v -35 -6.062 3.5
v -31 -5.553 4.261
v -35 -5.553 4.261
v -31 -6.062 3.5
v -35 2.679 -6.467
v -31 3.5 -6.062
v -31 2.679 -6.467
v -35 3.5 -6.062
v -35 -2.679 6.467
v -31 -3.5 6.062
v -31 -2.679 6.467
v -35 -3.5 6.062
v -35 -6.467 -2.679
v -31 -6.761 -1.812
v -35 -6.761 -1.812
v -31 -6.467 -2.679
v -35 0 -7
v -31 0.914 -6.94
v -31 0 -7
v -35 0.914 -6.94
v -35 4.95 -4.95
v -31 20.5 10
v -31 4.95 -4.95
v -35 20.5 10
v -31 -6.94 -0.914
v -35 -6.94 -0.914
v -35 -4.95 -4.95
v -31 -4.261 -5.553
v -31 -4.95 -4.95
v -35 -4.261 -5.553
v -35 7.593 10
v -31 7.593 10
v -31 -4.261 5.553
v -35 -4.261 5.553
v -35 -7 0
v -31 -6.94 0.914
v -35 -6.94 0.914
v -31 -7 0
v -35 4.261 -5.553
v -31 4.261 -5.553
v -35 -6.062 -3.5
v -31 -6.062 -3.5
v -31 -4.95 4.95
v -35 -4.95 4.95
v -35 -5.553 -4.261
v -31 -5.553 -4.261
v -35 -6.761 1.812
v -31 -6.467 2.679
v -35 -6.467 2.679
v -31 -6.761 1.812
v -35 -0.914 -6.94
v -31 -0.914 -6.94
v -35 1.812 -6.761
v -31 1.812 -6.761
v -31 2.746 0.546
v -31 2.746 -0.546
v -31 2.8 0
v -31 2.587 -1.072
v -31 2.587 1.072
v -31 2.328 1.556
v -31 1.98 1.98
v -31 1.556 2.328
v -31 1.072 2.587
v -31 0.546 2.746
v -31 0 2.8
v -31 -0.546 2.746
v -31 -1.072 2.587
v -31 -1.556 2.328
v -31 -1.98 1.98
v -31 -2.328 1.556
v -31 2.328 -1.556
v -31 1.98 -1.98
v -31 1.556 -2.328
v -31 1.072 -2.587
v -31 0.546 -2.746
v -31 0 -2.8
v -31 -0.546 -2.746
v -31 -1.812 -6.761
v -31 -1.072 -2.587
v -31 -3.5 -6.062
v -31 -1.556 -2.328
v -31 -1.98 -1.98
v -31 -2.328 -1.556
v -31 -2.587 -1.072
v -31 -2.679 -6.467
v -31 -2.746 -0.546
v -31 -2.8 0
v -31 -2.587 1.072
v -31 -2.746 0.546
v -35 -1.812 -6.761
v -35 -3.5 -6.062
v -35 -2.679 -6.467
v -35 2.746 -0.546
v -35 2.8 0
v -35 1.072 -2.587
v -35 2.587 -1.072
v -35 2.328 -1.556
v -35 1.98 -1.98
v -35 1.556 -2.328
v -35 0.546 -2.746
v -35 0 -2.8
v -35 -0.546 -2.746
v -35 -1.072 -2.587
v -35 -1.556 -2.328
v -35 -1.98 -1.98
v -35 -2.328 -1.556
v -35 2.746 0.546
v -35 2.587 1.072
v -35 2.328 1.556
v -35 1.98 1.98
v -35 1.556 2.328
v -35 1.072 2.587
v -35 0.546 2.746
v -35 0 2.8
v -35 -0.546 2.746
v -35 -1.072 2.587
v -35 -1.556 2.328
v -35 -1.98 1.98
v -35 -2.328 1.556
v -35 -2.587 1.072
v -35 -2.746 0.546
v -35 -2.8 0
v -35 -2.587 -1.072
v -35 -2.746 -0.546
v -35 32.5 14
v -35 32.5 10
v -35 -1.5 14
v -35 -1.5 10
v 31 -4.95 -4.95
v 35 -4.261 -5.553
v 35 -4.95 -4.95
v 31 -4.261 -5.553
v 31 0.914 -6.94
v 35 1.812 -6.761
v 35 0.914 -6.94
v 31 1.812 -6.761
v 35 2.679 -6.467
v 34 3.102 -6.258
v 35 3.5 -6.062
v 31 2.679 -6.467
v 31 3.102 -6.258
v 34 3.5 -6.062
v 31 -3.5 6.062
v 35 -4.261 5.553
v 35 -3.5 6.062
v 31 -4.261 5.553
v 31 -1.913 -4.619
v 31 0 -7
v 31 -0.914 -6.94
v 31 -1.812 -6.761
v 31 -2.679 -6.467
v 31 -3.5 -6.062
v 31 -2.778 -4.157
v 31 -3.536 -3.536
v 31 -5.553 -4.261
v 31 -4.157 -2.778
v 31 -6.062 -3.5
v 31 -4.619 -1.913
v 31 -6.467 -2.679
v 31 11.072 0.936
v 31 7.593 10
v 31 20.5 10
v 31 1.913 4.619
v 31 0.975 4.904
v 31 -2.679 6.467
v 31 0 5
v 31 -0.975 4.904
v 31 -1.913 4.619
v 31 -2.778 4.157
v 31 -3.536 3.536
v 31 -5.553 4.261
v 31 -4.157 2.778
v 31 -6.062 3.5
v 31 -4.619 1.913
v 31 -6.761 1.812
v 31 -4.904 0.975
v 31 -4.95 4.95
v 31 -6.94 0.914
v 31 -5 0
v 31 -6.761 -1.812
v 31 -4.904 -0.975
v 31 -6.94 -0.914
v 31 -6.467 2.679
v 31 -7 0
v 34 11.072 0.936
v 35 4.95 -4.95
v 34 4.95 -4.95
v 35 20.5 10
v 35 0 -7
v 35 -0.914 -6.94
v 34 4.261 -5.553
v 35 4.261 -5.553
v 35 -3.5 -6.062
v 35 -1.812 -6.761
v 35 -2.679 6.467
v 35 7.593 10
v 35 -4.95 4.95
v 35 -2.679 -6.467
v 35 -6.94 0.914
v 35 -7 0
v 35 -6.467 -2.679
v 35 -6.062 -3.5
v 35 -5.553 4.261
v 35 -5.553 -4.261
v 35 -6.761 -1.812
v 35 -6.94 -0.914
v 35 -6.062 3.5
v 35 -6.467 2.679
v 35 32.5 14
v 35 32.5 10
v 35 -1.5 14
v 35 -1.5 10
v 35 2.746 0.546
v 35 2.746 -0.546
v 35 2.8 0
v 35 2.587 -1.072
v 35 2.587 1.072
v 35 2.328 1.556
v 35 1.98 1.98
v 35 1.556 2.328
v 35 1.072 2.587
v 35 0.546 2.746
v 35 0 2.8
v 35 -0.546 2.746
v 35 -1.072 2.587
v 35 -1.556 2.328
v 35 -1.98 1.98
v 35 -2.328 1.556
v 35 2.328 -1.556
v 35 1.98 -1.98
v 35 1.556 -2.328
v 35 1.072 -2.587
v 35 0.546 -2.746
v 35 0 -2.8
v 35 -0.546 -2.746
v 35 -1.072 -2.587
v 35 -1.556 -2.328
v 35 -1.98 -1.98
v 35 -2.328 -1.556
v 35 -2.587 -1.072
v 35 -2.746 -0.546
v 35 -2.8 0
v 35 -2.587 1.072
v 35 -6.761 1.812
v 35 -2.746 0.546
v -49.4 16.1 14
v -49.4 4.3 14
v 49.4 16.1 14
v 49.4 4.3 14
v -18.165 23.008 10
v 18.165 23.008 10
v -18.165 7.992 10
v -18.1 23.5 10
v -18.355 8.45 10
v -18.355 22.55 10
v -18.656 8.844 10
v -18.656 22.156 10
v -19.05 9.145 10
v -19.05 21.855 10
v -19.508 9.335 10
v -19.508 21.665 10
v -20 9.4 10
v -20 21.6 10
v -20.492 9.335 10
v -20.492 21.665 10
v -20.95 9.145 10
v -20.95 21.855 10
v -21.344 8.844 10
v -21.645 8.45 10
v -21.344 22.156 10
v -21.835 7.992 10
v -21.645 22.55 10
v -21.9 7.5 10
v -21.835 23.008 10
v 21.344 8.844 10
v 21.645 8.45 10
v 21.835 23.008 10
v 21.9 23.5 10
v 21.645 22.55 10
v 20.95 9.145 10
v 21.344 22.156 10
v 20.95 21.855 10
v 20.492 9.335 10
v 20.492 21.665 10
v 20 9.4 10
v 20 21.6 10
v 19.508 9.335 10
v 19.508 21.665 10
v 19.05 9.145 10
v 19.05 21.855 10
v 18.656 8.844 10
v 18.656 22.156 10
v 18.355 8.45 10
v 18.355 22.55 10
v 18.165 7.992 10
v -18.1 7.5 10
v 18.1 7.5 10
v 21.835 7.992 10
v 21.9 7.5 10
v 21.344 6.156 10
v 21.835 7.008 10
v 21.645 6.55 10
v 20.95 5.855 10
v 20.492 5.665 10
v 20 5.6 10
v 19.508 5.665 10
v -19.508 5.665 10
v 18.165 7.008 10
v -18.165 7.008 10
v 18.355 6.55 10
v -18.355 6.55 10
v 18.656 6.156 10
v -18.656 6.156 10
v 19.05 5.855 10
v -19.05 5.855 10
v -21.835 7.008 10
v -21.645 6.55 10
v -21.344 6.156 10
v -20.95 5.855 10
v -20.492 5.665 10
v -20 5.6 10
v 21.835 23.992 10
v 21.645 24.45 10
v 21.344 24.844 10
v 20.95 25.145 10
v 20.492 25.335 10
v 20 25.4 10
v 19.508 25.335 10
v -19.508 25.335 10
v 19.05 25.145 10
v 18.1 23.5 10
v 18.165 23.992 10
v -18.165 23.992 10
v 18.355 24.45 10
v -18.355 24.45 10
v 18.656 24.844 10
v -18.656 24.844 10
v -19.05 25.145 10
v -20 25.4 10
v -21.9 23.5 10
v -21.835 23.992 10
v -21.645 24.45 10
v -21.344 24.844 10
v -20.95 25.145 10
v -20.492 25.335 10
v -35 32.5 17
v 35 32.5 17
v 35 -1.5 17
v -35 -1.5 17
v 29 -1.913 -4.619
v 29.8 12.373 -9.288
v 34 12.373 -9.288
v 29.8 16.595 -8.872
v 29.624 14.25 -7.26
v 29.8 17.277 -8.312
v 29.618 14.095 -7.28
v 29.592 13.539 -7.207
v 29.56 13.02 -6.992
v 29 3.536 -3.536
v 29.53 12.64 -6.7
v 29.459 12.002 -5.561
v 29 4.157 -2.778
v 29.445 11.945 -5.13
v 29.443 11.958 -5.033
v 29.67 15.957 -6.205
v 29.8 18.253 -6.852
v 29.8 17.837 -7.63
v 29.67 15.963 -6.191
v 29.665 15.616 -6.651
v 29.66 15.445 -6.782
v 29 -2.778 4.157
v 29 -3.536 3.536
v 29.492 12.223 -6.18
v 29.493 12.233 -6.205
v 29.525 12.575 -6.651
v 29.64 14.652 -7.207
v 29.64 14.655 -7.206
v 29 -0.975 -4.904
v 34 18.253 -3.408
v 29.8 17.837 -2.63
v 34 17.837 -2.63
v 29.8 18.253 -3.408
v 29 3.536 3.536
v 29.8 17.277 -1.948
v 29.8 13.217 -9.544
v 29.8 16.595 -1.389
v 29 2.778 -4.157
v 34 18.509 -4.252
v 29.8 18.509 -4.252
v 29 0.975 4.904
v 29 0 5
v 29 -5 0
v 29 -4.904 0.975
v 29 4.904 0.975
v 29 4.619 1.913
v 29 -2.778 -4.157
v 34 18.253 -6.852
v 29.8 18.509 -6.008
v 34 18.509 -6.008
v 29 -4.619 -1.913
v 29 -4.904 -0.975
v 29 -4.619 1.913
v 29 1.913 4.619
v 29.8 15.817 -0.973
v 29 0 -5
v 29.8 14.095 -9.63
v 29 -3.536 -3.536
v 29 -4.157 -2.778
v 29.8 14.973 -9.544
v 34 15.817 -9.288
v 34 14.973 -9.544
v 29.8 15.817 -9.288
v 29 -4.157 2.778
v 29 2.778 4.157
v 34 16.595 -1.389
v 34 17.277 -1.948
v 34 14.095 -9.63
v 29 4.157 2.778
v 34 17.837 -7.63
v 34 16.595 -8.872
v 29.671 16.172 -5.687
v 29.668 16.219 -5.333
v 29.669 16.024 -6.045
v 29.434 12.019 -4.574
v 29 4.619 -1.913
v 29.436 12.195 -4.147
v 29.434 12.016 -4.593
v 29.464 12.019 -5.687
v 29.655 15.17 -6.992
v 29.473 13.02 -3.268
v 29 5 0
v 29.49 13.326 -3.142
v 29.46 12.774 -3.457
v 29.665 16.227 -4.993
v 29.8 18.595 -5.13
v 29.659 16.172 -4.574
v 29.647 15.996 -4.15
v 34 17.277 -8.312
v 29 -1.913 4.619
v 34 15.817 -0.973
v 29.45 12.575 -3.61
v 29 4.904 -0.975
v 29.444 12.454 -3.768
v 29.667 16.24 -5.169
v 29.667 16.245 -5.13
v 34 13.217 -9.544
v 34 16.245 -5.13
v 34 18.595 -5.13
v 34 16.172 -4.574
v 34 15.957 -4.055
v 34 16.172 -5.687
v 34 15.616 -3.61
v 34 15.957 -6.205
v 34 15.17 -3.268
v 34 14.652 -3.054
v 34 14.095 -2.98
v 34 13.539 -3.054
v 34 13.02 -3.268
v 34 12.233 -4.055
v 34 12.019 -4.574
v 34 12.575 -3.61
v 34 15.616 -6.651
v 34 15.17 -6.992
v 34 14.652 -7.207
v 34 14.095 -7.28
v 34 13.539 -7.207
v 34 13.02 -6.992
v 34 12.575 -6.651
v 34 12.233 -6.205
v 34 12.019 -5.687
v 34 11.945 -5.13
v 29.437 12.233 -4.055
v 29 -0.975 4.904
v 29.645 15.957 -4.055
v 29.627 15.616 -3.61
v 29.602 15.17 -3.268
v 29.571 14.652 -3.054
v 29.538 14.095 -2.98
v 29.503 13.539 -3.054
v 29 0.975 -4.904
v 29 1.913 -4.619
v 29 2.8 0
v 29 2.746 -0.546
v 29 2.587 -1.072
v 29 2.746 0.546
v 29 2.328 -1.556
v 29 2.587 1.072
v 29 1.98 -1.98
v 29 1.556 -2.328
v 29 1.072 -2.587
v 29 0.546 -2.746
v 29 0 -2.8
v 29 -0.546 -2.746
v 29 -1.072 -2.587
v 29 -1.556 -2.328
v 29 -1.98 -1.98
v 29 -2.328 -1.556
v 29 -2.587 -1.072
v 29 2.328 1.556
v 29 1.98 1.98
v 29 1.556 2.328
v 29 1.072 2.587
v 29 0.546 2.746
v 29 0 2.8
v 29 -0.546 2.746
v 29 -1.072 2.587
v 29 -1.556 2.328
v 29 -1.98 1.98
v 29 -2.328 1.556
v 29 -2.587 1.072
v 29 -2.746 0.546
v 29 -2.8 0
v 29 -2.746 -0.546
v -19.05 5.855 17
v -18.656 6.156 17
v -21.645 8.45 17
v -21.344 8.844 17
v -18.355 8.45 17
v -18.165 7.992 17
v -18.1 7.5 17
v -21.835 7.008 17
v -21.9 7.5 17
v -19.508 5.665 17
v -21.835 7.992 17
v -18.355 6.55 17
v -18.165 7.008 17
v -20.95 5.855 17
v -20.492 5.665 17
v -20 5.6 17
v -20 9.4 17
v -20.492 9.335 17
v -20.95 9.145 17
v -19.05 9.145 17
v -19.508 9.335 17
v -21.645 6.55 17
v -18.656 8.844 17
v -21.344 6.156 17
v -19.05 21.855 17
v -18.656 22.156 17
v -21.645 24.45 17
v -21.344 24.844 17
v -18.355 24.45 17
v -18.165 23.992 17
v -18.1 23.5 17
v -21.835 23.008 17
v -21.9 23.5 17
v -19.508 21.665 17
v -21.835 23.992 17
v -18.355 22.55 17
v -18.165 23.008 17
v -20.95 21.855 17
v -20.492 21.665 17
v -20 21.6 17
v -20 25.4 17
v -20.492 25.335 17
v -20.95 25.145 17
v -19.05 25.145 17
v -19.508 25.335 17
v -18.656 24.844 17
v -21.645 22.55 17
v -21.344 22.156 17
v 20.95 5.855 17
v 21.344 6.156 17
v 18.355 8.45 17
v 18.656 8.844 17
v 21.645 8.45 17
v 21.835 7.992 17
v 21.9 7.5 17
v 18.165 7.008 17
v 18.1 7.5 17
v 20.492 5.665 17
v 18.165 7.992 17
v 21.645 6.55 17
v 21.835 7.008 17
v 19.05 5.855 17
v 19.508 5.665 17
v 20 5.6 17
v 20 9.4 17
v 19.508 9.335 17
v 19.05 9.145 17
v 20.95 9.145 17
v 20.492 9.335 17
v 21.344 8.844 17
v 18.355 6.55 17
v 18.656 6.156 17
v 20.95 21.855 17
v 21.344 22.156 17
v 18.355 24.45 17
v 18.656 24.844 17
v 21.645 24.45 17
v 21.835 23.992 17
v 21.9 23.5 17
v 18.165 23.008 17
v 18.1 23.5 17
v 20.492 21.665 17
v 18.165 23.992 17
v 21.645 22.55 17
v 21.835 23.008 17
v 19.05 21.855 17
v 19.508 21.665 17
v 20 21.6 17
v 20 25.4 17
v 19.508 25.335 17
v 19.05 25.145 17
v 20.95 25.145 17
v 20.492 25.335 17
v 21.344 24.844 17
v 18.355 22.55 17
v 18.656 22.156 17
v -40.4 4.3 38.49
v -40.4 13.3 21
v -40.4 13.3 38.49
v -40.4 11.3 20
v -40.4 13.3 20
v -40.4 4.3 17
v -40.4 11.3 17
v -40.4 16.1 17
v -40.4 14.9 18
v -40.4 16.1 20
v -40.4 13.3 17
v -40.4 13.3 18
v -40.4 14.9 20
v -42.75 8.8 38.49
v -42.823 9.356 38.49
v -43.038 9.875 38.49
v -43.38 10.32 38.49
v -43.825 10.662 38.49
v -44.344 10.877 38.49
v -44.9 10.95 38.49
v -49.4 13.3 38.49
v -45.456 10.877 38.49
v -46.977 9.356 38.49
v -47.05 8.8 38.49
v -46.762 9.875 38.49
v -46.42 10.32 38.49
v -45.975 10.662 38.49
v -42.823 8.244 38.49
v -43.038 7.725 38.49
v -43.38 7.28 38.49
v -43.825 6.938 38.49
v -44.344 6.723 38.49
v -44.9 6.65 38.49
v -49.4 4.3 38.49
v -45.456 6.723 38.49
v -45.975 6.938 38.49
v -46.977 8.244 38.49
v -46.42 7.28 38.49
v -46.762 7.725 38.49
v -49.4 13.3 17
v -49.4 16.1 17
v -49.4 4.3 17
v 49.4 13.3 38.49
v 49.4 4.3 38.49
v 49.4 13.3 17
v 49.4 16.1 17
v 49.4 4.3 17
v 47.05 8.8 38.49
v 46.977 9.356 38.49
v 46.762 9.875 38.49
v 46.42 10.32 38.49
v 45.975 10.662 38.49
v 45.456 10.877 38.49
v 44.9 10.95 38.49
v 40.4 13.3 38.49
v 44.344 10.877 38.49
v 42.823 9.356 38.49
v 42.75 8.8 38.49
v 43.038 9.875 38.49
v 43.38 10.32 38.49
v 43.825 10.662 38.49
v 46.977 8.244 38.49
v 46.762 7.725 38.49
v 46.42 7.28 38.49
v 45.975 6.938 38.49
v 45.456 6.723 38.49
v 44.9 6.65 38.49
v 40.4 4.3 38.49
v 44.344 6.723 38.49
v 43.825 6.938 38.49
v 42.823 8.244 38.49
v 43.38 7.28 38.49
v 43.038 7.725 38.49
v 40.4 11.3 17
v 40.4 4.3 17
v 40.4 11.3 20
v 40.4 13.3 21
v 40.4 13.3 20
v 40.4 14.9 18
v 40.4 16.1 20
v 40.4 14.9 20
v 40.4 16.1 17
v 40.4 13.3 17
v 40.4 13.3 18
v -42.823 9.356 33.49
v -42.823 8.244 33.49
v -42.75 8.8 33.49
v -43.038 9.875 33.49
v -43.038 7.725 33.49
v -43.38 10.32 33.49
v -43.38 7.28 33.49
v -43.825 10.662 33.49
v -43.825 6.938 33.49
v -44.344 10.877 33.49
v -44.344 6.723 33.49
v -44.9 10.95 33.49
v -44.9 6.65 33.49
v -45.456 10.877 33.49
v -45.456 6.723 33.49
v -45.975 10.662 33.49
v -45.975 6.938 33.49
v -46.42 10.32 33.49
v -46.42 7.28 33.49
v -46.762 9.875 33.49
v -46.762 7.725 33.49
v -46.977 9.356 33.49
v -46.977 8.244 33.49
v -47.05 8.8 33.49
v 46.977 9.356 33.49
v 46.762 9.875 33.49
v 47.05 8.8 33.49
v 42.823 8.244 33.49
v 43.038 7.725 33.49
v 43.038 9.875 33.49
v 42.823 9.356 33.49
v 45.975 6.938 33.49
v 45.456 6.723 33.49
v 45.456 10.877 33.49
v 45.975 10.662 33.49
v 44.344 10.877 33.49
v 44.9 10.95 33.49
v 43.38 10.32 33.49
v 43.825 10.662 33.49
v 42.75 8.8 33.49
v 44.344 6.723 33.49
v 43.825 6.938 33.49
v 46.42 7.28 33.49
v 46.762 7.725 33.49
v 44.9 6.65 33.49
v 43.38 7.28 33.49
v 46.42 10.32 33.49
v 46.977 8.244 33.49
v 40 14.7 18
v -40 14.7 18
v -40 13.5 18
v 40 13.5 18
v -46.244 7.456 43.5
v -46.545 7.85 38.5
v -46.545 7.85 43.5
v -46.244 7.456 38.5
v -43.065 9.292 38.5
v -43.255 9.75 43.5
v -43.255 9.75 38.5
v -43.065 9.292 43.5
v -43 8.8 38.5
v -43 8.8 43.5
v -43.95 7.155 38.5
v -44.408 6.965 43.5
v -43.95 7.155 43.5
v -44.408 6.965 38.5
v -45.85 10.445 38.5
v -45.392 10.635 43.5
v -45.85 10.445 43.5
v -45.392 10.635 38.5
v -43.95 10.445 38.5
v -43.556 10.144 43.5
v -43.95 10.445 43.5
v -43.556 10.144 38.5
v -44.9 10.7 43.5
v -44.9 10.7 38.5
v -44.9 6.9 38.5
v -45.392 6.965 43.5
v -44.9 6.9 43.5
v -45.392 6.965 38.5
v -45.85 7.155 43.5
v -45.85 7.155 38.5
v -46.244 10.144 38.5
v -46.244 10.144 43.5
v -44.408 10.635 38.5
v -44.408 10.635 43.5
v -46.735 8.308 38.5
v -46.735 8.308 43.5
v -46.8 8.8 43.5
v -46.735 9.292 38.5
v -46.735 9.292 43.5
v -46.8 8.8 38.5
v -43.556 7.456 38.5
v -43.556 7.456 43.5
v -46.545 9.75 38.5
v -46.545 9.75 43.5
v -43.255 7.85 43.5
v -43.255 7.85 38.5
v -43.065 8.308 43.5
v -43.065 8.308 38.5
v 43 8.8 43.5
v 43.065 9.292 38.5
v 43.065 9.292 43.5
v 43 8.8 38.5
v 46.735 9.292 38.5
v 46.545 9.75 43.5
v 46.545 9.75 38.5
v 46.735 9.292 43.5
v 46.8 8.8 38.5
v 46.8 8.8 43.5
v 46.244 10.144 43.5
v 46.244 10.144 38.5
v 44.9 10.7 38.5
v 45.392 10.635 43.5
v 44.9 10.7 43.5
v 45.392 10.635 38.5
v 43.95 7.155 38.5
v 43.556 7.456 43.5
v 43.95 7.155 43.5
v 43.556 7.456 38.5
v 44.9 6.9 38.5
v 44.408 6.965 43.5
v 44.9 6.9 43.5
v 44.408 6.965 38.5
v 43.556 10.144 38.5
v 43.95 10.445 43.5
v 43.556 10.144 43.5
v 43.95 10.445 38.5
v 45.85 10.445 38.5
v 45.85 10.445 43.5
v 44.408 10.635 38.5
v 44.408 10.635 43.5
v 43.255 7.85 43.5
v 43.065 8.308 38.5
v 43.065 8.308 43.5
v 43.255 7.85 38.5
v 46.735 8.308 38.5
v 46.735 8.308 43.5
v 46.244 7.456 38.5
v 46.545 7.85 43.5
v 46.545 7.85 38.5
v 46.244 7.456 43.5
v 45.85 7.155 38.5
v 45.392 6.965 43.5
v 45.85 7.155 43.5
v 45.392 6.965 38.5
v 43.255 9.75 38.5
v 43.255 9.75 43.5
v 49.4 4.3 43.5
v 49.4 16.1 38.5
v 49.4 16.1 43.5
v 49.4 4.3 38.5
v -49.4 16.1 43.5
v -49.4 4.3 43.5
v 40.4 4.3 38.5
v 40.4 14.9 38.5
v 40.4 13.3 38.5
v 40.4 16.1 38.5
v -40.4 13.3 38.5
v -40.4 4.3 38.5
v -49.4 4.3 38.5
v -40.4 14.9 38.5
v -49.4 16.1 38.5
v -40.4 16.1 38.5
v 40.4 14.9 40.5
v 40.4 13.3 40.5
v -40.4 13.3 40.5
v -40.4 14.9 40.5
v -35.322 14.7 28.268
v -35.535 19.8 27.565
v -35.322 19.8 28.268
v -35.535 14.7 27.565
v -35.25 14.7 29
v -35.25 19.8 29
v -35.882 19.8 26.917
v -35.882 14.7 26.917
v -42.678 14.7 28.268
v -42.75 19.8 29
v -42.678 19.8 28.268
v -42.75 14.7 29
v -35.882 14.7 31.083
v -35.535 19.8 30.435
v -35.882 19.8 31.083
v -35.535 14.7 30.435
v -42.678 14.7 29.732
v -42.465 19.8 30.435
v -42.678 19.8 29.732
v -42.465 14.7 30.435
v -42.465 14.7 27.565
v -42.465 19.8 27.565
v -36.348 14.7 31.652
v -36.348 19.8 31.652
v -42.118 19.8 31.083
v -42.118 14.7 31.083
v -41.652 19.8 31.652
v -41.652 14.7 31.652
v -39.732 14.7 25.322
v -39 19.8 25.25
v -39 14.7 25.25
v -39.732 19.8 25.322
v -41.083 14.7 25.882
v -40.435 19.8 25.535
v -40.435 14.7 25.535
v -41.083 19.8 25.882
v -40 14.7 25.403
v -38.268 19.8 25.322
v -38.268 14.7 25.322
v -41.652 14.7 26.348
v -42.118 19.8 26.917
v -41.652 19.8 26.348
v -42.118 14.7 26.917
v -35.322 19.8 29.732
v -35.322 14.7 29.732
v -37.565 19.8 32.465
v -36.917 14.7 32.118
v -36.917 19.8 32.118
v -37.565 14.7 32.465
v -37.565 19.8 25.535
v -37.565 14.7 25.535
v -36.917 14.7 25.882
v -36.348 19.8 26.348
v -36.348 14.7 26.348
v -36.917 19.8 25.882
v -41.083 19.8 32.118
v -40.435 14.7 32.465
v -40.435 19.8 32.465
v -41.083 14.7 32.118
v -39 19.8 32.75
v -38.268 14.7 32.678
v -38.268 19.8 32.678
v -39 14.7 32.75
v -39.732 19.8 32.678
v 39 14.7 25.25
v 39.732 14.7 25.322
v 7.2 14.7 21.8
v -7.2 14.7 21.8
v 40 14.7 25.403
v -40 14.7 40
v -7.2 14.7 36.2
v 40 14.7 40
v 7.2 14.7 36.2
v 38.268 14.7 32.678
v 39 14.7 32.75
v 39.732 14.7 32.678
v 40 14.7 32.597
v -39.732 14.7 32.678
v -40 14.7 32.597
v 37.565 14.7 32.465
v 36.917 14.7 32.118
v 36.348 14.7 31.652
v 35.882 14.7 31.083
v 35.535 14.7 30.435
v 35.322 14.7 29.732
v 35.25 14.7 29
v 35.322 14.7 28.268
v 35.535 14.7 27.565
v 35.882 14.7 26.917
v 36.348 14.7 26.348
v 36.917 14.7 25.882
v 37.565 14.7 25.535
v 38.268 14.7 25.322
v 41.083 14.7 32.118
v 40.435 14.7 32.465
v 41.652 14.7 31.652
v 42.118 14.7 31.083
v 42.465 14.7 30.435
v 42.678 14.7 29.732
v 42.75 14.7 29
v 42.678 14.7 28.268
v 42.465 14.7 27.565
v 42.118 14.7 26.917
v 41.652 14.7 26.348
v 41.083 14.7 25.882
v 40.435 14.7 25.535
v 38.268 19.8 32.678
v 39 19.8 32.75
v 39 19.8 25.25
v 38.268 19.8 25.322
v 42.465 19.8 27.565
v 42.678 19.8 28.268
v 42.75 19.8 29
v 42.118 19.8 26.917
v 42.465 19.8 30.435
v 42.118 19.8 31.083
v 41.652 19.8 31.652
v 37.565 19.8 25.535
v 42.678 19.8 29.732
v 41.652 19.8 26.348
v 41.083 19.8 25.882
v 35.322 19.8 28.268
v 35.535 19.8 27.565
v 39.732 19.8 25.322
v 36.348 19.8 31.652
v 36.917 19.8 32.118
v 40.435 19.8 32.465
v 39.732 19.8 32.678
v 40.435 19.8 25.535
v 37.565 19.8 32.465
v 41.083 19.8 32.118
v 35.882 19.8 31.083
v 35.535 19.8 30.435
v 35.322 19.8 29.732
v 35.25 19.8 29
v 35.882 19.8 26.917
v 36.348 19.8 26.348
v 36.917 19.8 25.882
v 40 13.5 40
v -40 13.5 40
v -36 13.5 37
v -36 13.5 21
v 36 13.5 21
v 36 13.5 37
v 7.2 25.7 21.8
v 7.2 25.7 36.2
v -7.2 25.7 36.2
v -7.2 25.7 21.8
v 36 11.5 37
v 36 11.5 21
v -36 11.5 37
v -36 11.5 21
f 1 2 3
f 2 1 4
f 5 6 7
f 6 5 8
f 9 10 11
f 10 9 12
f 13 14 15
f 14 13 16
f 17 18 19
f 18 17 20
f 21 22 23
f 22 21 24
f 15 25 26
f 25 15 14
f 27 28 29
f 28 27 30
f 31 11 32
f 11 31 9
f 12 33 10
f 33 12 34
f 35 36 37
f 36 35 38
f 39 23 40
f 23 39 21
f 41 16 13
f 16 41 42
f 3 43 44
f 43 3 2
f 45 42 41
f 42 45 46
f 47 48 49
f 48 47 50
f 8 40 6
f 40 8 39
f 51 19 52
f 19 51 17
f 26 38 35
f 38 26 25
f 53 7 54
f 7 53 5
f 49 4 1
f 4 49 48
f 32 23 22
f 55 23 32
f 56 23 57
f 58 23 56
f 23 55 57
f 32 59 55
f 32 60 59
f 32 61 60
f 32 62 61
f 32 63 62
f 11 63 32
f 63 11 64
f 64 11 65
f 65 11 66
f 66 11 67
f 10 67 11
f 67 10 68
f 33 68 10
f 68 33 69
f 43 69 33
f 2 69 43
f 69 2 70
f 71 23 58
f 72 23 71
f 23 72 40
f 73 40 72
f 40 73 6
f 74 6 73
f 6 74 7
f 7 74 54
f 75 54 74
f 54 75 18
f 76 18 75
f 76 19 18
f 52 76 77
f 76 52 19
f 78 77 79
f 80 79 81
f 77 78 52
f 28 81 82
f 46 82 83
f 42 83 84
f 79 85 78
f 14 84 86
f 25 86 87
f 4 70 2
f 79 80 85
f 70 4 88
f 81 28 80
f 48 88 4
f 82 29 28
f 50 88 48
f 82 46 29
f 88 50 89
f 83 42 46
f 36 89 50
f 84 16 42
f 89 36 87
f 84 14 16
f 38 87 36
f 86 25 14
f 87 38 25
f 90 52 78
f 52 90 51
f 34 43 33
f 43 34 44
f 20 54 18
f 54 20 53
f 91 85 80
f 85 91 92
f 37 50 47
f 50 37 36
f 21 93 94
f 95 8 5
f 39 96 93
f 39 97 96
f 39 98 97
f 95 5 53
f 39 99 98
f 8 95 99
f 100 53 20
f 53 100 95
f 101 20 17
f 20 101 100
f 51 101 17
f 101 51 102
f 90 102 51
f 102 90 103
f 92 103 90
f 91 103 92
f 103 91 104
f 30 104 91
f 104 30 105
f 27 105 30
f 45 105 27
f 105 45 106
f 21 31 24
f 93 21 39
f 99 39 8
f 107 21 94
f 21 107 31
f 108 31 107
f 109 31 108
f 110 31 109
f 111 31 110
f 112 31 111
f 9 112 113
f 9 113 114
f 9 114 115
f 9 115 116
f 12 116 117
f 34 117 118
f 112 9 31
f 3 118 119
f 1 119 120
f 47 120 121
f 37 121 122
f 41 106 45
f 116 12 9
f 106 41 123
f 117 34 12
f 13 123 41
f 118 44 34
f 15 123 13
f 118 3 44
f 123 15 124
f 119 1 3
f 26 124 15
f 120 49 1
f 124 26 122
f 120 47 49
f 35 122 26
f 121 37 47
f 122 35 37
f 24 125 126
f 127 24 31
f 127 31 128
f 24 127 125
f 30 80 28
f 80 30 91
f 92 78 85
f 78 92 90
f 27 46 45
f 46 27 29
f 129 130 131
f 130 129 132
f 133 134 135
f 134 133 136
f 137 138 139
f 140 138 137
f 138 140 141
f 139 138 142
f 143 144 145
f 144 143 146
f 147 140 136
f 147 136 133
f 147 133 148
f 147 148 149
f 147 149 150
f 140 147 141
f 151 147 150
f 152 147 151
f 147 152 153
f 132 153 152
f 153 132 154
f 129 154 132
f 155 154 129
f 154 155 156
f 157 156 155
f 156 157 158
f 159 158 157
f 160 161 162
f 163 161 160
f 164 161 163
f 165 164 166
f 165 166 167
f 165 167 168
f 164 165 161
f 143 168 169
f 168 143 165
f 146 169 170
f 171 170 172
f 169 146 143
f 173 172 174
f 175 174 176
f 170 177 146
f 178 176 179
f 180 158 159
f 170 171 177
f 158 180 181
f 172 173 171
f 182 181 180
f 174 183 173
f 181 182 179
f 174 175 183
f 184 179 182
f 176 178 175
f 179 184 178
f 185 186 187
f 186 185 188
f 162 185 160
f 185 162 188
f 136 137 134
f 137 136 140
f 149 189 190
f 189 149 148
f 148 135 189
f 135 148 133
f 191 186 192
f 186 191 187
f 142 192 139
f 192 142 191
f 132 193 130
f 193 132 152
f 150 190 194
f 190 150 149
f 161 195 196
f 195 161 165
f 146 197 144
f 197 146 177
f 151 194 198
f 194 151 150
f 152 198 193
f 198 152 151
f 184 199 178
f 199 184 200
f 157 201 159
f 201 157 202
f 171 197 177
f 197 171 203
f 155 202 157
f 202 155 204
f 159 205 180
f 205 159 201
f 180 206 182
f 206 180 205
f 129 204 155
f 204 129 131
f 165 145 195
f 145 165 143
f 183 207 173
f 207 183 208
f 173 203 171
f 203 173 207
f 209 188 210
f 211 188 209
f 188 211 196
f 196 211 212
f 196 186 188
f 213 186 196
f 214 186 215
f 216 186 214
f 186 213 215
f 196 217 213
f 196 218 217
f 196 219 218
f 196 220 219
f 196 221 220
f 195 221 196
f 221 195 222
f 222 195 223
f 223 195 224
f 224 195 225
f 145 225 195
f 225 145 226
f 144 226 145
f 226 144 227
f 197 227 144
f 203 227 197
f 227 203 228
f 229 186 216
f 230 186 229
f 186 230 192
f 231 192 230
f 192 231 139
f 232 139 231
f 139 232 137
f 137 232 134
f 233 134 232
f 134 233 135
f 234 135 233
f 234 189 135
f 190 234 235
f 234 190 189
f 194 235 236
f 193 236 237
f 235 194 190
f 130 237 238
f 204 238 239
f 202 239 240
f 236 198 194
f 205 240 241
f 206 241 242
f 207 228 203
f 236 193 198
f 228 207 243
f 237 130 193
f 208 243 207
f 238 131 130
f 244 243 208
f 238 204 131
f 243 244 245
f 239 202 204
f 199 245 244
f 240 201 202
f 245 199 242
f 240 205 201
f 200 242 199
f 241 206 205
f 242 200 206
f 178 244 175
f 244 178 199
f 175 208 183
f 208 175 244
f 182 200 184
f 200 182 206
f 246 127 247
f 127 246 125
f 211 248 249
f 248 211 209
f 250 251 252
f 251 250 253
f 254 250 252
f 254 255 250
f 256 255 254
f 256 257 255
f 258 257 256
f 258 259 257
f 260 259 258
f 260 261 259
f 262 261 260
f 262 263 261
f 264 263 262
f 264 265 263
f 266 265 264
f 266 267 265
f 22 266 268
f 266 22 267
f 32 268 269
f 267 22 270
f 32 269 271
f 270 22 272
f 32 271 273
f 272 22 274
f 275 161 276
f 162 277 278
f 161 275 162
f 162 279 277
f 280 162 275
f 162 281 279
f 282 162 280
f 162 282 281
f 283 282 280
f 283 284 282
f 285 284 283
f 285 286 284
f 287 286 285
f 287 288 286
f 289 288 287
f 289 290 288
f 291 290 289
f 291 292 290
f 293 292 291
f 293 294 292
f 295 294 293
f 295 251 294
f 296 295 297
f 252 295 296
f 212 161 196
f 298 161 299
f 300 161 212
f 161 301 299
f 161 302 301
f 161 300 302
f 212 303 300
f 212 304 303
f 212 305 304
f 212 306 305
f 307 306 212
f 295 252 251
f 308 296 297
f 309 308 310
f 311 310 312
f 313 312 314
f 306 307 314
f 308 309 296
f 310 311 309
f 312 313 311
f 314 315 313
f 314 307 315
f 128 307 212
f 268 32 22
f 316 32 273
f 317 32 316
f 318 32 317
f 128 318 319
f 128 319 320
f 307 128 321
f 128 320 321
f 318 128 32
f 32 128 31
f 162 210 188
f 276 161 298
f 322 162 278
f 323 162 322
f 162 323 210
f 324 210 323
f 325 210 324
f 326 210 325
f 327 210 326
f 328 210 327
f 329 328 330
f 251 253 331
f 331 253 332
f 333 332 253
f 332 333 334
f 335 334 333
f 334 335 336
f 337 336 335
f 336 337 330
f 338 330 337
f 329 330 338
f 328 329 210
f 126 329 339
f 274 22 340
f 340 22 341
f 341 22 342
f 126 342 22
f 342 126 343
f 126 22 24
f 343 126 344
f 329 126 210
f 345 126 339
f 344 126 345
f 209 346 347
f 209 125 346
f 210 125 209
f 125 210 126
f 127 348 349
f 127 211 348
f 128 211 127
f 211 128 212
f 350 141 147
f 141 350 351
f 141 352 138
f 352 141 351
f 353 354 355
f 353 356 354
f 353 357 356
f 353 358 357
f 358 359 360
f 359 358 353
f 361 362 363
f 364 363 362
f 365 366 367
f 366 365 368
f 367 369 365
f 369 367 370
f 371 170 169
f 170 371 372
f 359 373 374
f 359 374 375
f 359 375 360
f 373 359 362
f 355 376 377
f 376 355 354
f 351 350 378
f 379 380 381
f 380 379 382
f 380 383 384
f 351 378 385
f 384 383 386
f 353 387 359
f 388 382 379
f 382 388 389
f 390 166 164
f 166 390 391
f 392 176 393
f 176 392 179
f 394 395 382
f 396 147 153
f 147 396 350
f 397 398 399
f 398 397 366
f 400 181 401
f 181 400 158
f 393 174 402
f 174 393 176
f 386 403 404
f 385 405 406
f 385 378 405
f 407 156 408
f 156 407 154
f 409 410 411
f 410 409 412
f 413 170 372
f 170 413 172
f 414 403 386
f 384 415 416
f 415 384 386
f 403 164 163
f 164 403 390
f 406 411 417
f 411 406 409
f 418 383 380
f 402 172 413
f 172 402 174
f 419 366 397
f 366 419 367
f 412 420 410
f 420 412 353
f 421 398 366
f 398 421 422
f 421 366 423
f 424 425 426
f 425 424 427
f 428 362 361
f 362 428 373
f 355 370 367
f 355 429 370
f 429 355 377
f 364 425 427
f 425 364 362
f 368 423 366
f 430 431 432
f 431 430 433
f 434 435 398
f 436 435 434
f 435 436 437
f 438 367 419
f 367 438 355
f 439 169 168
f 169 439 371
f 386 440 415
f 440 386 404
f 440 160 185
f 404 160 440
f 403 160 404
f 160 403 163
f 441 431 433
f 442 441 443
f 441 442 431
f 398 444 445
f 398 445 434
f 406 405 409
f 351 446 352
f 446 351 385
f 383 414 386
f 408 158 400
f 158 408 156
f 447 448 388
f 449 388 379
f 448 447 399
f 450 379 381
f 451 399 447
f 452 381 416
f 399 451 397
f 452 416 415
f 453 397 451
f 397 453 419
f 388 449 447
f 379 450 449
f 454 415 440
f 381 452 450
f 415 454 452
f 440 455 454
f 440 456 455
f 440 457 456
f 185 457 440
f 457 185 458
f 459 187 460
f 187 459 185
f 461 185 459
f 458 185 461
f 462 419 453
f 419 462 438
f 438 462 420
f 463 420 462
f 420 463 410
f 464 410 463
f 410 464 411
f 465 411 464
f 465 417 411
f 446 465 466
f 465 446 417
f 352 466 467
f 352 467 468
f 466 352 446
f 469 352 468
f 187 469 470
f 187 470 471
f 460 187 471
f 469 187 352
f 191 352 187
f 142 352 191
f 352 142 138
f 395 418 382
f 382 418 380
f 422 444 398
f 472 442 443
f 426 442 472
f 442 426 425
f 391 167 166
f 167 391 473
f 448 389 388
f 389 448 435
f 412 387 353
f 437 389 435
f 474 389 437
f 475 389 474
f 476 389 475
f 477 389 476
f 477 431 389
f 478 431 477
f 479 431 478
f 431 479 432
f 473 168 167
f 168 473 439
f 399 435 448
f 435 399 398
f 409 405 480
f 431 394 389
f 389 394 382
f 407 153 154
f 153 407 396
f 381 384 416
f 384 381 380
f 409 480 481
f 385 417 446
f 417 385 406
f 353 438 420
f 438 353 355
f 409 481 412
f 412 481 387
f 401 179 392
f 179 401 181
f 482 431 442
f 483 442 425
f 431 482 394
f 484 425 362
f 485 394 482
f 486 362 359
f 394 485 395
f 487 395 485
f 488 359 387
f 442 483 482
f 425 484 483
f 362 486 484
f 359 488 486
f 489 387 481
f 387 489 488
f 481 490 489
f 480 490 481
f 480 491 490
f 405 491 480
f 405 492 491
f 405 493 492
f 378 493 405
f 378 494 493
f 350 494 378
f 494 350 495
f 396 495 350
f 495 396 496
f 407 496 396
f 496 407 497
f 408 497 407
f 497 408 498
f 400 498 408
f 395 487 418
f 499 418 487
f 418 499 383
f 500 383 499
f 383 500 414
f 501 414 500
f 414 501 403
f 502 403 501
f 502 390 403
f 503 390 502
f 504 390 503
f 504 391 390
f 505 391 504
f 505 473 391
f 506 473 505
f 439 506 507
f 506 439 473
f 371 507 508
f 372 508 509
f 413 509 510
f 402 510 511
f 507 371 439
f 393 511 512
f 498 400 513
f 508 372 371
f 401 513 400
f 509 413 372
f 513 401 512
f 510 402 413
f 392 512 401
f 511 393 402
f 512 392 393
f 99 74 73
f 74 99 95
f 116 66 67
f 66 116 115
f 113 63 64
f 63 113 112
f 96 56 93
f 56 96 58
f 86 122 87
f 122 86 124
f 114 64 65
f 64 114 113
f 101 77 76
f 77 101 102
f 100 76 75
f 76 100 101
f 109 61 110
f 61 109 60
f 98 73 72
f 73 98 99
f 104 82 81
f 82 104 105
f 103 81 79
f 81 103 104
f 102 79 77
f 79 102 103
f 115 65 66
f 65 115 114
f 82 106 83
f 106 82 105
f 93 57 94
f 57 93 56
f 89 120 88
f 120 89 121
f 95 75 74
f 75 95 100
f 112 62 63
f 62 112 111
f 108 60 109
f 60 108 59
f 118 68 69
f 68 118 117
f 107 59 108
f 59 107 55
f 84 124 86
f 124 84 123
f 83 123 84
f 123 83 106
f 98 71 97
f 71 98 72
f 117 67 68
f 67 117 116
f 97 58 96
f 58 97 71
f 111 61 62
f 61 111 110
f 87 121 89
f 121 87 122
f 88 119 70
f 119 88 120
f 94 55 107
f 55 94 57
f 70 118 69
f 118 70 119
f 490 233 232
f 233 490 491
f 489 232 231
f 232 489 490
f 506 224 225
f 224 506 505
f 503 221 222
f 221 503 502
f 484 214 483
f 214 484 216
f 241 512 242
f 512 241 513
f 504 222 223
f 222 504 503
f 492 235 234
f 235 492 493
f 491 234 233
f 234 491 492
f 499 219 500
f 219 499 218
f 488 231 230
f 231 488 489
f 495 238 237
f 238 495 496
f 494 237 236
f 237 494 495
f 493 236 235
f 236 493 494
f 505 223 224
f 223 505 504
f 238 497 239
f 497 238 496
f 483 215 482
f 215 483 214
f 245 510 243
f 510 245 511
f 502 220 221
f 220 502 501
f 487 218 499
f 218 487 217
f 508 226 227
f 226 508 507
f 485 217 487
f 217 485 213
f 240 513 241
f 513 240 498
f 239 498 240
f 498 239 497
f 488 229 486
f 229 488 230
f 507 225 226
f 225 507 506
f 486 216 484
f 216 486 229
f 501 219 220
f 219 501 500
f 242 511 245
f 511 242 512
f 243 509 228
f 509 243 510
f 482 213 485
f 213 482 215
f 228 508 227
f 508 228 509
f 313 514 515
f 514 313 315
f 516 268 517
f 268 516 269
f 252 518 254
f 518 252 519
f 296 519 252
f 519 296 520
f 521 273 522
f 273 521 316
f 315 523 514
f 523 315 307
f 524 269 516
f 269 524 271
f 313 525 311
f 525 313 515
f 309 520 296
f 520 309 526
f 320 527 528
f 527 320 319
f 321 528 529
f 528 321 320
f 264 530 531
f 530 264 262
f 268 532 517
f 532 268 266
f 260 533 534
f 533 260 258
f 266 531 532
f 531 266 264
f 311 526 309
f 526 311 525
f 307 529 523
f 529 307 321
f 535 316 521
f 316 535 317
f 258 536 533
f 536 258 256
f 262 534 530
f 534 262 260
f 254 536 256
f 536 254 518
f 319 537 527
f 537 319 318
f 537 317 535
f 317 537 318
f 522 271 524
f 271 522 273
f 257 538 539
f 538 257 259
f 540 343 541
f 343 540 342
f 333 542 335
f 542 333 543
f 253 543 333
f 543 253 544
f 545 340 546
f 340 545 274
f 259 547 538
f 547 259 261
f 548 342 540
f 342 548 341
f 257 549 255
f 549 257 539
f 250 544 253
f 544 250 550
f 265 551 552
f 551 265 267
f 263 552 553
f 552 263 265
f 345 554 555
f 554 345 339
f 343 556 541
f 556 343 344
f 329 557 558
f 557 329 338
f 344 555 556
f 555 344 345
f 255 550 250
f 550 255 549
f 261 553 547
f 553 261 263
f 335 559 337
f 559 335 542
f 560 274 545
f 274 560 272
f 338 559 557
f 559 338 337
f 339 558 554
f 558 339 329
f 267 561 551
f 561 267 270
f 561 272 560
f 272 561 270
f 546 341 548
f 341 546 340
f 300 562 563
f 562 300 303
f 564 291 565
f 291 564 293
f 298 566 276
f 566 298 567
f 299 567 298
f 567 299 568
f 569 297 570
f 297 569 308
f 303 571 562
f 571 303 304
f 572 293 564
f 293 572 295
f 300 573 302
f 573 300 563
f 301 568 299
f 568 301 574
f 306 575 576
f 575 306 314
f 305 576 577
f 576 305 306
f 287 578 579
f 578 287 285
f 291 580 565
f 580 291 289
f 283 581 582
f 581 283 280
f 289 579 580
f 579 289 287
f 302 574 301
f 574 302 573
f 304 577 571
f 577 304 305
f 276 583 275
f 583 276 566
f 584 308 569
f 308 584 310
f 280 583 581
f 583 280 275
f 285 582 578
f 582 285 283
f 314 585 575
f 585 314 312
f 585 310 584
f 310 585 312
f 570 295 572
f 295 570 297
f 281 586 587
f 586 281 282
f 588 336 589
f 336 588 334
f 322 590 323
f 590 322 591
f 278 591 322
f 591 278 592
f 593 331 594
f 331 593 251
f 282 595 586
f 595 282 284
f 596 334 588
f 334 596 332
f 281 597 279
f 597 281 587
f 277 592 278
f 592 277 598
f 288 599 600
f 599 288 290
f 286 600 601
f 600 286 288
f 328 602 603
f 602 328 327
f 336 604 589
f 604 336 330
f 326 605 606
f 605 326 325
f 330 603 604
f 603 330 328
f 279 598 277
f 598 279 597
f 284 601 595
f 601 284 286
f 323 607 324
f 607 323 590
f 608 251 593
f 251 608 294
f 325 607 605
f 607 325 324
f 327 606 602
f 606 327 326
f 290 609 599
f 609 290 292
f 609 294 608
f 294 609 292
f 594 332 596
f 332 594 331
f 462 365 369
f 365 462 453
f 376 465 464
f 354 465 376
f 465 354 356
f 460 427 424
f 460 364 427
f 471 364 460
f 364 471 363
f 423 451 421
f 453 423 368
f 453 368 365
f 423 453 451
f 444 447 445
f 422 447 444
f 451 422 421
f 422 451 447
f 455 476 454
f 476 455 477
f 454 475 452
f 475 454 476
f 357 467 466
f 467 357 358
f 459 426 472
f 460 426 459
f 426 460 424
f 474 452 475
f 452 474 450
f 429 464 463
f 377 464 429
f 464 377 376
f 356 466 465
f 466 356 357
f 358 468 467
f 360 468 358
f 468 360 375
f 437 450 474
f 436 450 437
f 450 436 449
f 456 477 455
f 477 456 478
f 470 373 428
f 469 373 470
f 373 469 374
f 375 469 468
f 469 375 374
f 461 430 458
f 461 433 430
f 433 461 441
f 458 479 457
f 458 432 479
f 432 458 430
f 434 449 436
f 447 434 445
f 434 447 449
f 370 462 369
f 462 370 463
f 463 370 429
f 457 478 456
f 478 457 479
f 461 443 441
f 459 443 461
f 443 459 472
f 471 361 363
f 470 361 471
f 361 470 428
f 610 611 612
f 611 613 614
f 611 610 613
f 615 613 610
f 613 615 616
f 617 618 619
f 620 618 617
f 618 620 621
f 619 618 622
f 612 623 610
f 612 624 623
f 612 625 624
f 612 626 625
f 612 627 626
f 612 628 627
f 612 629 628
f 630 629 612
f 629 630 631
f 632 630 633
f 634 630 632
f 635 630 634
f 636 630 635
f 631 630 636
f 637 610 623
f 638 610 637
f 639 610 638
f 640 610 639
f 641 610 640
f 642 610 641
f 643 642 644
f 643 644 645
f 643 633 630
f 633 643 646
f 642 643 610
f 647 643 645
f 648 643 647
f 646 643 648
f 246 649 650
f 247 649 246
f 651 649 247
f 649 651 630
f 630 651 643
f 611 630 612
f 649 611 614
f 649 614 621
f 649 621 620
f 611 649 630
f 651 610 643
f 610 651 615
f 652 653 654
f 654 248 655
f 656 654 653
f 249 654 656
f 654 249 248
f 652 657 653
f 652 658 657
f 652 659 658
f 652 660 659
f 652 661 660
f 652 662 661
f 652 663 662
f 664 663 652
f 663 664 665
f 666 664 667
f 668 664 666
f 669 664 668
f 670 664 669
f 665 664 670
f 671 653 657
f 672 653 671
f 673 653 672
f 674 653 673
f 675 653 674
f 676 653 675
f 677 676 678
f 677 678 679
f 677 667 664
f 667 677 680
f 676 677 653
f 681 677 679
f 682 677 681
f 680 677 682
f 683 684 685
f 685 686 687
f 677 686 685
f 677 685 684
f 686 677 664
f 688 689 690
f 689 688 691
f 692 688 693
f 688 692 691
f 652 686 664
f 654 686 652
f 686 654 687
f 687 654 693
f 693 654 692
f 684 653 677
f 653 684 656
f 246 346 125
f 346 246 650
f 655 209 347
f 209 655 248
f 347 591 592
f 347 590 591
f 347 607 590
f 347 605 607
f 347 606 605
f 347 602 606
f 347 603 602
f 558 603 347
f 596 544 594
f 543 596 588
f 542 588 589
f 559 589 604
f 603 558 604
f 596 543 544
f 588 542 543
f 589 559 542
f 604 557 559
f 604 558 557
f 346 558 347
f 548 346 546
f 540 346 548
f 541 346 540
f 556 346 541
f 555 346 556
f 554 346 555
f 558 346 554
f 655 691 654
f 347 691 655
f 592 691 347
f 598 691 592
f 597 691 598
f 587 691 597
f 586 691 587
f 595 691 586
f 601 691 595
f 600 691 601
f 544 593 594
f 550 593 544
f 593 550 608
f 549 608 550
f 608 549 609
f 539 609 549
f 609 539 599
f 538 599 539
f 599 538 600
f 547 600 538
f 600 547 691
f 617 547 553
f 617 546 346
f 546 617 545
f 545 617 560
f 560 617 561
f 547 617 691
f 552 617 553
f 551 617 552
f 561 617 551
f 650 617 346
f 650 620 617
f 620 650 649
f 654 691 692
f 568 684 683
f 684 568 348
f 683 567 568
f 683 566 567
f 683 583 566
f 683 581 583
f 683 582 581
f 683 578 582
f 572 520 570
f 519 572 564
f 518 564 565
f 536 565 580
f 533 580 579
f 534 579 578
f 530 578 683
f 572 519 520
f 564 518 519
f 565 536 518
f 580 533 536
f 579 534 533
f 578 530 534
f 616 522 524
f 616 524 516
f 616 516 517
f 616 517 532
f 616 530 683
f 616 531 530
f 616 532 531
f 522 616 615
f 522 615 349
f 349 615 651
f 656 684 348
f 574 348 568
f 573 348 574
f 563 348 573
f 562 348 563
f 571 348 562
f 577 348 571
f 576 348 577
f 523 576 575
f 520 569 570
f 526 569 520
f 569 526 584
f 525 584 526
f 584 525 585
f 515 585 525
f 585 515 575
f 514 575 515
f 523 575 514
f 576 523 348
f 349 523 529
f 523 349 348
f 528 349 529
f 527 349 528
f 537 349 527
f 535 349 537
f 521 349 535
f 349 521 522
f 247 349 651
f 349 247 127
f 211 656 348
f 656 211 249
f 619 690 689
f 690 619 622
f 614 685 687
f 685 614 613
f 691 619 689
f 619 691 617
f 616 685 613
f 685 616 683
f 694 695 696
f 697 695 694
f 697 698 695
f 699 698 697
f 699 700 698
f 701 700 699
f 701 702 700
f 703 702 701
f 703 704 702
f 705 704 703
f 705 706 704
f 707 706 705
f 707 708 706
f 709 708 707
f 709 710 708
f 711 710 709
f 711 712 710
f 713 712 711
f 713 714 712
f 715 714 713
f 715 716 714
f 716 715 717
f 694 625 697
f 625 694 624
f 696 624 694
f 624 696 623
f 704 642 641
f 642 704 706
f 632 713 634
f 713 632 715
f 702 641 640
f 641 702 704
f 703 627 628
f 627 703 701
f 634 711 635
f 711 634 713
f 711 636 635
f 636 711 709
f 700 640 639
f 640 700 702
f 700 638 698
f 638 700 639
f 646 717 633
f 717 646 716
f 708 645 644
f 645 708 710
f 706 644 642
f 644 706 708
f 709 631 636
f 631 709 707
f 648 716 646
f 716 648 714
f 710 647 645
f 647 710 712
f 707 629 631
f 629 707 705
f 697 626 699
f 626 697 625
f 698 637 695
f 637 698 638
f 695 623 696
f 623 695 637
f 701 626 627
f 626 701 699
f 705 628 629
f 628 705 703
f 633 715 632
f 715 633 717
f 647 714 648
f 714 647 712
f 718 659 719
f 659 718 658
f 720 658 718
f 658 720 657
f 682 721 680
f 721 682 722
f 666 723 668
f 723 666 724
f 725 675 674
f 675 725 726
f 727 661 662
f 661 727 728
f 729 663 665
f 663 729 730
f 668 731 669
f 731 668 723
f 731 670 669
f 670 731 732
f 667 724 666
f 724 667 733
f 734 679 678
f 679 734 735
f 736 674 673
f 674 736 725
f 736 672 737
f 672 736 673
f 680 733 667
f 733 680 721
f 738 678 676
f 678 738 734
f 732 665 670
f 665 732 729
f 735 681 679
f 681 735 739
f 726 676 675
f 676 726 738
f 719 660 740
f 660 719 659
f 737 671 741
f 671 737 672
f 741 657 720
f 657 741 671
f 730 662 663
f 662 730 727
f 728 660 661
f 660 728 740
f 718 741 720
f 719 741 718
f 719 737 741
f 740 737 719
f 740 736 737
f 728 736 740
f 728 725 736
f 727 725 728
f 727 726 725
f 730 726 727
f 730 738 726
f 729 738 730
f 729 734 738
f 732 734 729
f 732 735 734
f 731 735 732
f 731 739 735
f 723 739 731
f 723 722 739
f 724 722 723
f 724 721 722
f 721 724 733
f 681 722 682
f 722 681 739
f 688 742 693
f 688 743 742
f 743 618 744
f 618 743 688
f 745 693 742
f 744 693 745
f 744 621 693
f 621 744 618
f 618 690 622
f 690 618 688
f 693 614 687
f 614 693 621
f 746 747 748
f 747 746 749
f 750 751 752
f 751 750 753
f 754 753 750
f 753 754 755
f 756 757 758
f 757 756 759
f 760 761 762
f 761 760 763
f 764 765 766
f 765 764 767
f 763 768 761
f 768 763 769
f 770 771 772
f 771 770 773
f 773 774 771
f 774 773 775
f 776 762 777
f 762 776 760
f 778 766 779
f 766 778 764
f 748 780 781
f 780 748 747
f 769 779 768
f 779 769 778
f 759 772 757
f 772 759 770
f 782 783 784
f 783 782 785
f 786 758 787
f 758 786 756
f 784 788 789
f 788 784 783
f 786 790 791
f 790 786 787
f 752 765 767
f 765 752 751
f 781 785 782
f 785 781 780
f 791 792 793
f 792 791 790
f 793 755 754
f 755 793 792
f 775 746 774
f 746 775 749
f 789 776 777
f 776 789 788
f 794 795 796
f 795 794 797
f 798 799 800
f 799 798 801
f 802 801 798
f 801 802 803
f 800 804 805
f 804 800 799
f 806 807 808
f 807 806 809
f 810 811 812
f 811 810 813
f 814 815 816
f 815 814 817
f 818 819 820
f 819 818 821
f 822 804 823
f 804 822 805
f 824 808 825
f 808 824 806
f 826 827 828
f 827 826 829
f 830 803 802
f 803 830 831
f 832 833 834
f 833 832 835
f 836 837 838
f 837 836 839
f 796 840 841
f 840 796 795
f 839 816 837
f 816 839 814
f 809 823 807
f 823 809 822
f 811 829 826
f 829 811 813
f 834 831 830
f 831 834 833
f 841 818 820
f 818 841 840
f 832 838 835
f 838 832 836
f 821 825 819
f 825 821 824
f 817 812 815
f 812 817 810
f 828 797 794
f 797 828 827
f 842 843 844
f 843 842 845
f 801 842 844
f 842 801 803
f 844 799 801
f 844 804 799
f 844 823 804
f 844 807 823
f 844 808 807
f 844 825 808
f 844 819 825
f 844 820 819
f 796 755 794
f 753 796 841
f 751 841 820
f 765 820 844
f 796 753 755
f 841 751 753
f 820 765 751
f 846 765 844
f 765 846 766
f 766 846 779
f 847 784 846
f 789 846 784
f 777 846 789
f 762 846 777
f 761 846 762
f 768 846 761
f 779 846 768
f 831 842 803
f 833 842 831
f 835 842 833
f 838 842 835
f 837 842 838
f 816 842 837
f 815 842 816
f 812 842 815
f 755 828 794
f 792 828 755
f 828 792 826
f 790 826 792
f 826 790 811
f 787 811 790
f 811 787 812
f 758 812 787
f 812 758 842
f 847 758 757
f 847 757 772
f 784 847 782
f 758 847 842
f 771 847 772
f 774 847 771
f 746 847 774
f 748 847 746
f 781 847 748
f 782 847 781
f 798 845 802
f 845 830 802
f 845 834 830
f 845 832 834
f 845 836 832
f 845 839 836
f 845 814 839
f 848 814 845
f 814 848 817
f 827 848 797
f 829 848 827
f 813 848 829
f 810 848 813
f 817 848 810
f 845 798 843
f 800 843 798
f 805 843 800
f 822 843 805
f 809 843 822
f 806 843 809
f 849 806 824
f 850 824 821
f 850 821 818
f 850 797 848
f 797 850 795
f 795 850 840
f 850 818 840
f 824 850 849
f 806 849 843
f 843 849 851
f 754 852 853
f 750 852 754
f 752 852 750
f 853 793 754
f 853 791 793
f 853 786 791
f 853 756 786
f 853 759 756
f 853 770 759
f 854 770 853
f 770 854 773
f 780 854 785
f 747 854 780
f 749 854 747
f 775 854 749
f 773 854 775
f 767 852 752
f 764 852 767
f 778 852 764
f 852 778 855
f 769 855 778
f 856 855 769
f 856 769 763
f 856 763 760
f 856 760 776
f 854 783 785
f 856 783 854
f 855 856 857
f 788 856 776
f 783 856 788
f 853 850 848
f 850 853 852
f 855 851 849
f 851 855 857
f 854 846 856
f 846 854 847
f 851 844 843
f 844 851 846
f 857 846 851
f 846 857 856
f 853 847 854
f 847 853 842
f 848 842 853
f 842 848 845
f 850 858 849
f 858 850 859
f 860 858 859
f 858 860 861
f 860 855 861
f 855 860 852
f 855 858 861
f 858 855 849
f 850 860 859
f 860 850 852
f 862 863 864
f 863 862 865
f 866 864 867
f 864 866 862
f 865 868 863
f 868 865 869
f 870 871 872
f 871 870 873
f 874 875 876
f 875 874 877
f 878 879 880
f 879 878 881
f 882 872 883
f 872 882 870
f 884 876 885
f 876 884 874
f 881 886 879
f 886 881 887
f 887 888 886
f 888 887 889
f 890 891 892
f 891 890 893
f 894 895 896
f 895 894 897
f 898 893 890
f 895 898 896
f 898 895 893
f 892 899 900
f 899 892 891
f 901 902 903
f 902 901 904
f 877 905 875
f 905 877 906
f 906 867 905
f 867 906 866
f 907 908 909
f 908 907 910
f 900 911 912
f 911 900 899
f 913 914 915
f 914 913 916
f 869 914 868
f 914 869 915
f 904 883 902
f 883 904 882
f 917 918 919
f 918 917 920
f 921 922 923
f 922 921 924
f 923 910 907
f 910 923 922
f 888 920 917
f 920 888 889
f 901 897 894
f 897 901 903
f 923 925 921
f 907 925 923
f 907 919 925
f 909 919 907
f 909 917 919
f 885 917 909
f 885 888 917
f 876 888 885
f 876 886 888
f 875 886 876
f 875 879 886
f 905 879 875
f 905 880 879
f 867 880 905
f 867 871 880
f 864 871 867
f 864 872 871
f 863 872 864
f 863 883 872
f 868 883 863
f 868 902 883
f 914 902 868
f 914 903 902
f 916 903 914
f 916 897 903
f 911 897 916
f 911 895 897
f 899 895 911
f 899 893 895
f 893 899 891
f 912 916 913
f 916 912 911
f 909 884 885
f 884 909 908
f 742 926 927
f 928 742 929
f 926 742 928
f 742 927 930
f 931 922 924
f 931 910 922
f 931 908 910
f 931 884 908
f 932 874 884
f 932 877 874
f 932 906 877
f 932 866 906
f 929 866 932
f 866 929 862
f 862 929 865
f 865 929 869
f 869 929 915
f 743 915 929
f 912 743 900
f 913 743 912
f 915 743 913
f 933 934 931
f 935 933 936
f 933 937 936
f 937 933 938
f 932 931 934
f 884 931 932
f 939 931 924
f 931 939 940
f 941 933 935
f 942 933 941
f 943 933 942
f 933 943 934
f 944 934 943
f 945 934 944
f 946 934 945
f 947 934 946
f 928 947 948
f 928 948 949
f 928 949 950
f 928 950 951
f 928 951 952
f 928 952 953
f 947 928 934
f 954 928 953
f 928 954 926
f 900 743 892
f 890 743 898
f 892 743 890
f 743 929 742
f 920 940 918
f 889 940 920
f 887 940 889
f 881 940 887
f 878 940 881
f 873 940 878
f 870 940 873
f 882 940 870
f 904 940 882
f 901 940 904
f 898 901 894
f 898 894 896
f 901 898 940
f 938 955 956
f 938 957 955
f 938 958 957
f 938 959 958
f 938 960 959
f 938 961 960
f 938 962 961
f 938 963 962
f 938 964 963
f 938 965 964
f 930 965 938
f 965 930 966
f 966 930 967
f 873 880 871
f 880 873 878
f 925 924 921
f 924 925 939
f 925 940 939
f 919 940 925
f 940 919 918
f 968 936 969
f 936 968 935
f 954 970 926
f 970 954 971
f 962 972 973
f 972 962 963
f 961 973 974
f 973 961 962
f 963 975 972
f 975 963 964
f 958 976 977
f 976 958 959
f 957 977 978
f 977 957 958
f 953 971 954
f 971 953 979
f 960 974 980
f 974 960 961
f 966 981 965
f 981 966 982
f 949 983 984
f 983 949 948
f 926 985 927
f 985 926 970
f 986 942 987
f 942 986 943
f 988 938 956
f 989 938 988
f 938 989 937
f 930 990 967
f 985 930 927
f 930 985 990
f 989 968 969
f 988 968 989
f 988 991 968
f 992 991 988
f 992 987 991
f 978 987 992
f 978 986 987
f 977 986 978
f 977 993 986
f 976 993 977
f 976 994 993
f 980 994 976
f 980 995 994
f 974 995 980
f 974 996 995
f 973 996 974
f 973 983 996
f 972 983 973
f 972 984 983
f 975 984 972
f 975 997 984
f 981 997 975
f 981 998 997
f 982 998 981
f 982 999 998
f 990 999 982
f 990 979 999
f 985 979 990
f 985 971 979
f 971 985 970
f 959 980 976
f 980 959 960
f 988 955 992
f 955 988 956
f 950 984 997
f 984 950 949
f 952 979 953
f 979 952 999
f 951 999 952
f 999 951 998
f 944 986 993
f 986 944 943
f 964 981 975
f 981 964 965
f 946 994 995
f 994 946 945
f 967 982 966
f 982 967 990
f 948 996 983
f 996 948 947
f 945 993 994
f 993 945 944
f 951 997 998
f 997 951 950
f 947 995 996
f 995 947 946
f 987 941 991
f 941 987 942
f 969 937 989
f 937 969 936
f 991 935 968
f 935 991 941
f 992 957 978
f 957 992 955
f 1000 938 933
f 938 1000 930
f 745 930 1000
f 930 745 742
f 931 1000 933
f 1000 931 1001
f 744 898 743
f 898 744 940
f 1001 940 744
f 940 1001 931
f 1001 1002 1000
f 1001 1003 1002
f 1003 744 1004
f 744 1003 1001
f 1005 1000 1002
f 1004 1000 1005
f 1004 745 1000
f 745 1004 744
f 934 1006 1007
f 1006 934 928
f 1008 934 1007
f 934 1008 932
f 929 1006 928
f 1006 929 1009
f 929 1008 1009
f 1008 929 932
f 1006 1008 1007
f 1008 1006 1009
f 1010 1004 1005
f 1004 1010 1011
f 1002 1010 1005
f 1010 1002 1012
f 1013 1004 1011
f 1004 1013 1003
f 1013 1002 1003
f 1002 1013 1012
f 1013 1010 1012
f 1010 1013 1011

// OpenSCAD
// C920 camera holder for the servo test stand's head: bolts onto the head's bridge plate (its 4 x M3 holes),
// so the head, its link and the servo calibration don't change.
//
//   The bare C920 board (80 x 22 x 1.2; lens block 14.4 square, 11 tall; microphones 5.1 tall at the ends;
//   parts up to 2 mm on the back, the cable soldered on the back) stands UPRIGHT, facing forward: the camera
//   looks along the bridge, so "bridge level" is still "looking straight ahead".
//   HOLDER  a base on the bridge (4 x M3 down through it, nuts underneath), a grooved rail for the board's
//           bottom edge, and two posts at the ends, behind the board (clear of the microphones)
//   RAIL    the top rail: a groove over the board's top edge, 2 x M3 down into inserts in the posts
//   The rails grip only the board's top and bottom edges (2 mm), open at the back for the cable.
//
// Frame: the head's (as head() in servo_test_stand.scad): axle along X at the origin, +Y forward, +Z up.
// part = "holder" | "rail" | "view"
include <../servo_test_stand.scad>
part = "view";                       // (after the include: overrides the stand's own part)

// ---- the board (MEASURED 2026-10-21) --------------------------------------------------------------
c_b      = [80, 22, 1.2];           // length (X), height (Z), thickness (Y)
c_lens   = [14.4, 11];              // lens block: square side, height above the board's front
c_mic    = [7.5, 5.1];              // microphones: diameter, height (centred on the board's ends)
c_back   = 2;                       // tallest parts on the back

// ---- holder -----------------------------------------------------------------------------------------
c_fit    = 0.2;                     // groove clearance on each face of the board
c_slack  = 0.5;                     // extra height between the grooves (the board's height is approximate)
c_grip   = 2;                       // how far the grooves reach over the board's edges
c_lip    = 1.2;                     // groove front lip thickness
c_bwall  = 2;                       // groove back wall thickness
base_t   = 3;
post     = 9;                       // posts: square, at the board's ends, behind it (insert M3 from the top)
rail_t   = 3;                       // top rail: solid above the groove

z_base   = bridge_dz + bridge[2];   // the base sits on the bridge
yb       = head_dy - 2;             // the board's back face: lens block over the bridge, screws clear
yf       = yb + c_b[2];             // ... and front face
zg       = z_base + base_t + 1;     // groove floor = the board's bottom edge
z_top    = zg + c_b[1] + c_slack;   // top groove's ceiling
xr       = c_b[0] / 2 + 0.4;        // grooves' ends (the board's ends + clearance)
gy       = [yb - c_fit, yf + c_fit];                       // groove, Y
ry       = [gy[0] - c_bwall, gy[1] + c_lip];               // rails, Y
py       = [gy[0] - post, gy[0]];                          // posts, Y (behind the board)
px       = [xr, xr + post];                                // posts, X (each side)
z_post   = z_top - c_grip - 0.01;   // post tops: the top rail sits on them
brg_holes = [for (x = [-20, 20], y = [-8, 8]) [x, head_dy + y]];   // the bridge's camera holes

module c920() {                     // the board, for the view and the clash check
    color("#2e7d32") translate([-c_b[0] / 2, yb, zg]) cube([c_b[0], c_b[2], c_b[1]]);
    color("#111") translate([-c_lens[0] / 2, yf, zg + c_b[1] / 2 - c_lens[0] / 2]) cube([c_lens[0], c_lens[1], c_lens[0]]);
    color("#999") for (s = [-1, 1]) translate([s * (c_b[0] / 2 - 1), yf, zg + c_b[1] / 2]) rotate([-90, 0, 0])
        cylinder(d = c_mic[0], h = c_mic[1], $fn = 32);
    color("#666") translate([-c_b[0] / 2 + 4, yb - c_back, zg + 3]) cube([c_b[0] - 8, c_back, c_b[1] - 6]);
}

module holder() {
    difference() {
        union() {
            hull() {                                                                         // base
                box([-bridge[0] / 2, bridge[0] / 2], [head_dy - bridge[1] / 2, head_dy + bridge[1] / 2], [z_base, z_base + base_t]);
                box([-px[1], px[1]], [py[0], ry[1]], [z_base, z_base + base_t]);
            }
            box([-xr, xr], ry, [z_base, zg + c_grip]);                                       // bottom rail
            for (s = [-1, 1]) box(s > 0 ? px : [-px[1], -px[0]], py, [z_base, z_post]);     // posts
        }
        box([-xr, xr], gy, [zg, zg + c_grip + 1]);                                           // bottom groove
        for (h = brg_holes) translate([h[0], h[1], z_base - 1]) hole3(base_t + 2);           // 4 x M3 to the bridge
        for (s = [-1, 1]) translate([s * (px[0] + post / 2), (py[0] + py[1]) / 2, z_post - insert_m3[1]]) insert3();
    }
}

module top_rail() {
    difference() {
        box([-px[1], px[1]], [py[0], ry[1]], [z_post + 0.01, z_top + rail_t]);
        box([-xr, xr], gy, [z_post - 1, z_top]);                                             // top groove
        box([-xr, xr], [ry[1] - c_lip - 0.01, ry[1] + 1], [z_post - 1, z_top - c_grip]);     // (front lip: just c_grip deep)
        box([-xr, xr], [py[0] - 1, gy[0] + 0.01], [z_post - 1, z_top - c_grip]);             // (back: just c_grip deep)
        for (s = [-1, 1]) translate([s * (px[0] + post / 2), (py[0] + py[1]) / 2, z_post - 1]) hole3(z_top + rail_t - z_post + 2);
    }
}

if (part == "holder") translate([0, 0, -z_base]) holder();                                   // base on the bed
if (part == "rail")   translate([0, 0, z_top + rail_t]) rotate([180, 0, 0]) top_rail();      // top face on the bed
if (part == "view") {
    color("#6b8fb5") head();
    color("#c55") holder();
    color("#e8a33d") top_rail();
    c920();
}
